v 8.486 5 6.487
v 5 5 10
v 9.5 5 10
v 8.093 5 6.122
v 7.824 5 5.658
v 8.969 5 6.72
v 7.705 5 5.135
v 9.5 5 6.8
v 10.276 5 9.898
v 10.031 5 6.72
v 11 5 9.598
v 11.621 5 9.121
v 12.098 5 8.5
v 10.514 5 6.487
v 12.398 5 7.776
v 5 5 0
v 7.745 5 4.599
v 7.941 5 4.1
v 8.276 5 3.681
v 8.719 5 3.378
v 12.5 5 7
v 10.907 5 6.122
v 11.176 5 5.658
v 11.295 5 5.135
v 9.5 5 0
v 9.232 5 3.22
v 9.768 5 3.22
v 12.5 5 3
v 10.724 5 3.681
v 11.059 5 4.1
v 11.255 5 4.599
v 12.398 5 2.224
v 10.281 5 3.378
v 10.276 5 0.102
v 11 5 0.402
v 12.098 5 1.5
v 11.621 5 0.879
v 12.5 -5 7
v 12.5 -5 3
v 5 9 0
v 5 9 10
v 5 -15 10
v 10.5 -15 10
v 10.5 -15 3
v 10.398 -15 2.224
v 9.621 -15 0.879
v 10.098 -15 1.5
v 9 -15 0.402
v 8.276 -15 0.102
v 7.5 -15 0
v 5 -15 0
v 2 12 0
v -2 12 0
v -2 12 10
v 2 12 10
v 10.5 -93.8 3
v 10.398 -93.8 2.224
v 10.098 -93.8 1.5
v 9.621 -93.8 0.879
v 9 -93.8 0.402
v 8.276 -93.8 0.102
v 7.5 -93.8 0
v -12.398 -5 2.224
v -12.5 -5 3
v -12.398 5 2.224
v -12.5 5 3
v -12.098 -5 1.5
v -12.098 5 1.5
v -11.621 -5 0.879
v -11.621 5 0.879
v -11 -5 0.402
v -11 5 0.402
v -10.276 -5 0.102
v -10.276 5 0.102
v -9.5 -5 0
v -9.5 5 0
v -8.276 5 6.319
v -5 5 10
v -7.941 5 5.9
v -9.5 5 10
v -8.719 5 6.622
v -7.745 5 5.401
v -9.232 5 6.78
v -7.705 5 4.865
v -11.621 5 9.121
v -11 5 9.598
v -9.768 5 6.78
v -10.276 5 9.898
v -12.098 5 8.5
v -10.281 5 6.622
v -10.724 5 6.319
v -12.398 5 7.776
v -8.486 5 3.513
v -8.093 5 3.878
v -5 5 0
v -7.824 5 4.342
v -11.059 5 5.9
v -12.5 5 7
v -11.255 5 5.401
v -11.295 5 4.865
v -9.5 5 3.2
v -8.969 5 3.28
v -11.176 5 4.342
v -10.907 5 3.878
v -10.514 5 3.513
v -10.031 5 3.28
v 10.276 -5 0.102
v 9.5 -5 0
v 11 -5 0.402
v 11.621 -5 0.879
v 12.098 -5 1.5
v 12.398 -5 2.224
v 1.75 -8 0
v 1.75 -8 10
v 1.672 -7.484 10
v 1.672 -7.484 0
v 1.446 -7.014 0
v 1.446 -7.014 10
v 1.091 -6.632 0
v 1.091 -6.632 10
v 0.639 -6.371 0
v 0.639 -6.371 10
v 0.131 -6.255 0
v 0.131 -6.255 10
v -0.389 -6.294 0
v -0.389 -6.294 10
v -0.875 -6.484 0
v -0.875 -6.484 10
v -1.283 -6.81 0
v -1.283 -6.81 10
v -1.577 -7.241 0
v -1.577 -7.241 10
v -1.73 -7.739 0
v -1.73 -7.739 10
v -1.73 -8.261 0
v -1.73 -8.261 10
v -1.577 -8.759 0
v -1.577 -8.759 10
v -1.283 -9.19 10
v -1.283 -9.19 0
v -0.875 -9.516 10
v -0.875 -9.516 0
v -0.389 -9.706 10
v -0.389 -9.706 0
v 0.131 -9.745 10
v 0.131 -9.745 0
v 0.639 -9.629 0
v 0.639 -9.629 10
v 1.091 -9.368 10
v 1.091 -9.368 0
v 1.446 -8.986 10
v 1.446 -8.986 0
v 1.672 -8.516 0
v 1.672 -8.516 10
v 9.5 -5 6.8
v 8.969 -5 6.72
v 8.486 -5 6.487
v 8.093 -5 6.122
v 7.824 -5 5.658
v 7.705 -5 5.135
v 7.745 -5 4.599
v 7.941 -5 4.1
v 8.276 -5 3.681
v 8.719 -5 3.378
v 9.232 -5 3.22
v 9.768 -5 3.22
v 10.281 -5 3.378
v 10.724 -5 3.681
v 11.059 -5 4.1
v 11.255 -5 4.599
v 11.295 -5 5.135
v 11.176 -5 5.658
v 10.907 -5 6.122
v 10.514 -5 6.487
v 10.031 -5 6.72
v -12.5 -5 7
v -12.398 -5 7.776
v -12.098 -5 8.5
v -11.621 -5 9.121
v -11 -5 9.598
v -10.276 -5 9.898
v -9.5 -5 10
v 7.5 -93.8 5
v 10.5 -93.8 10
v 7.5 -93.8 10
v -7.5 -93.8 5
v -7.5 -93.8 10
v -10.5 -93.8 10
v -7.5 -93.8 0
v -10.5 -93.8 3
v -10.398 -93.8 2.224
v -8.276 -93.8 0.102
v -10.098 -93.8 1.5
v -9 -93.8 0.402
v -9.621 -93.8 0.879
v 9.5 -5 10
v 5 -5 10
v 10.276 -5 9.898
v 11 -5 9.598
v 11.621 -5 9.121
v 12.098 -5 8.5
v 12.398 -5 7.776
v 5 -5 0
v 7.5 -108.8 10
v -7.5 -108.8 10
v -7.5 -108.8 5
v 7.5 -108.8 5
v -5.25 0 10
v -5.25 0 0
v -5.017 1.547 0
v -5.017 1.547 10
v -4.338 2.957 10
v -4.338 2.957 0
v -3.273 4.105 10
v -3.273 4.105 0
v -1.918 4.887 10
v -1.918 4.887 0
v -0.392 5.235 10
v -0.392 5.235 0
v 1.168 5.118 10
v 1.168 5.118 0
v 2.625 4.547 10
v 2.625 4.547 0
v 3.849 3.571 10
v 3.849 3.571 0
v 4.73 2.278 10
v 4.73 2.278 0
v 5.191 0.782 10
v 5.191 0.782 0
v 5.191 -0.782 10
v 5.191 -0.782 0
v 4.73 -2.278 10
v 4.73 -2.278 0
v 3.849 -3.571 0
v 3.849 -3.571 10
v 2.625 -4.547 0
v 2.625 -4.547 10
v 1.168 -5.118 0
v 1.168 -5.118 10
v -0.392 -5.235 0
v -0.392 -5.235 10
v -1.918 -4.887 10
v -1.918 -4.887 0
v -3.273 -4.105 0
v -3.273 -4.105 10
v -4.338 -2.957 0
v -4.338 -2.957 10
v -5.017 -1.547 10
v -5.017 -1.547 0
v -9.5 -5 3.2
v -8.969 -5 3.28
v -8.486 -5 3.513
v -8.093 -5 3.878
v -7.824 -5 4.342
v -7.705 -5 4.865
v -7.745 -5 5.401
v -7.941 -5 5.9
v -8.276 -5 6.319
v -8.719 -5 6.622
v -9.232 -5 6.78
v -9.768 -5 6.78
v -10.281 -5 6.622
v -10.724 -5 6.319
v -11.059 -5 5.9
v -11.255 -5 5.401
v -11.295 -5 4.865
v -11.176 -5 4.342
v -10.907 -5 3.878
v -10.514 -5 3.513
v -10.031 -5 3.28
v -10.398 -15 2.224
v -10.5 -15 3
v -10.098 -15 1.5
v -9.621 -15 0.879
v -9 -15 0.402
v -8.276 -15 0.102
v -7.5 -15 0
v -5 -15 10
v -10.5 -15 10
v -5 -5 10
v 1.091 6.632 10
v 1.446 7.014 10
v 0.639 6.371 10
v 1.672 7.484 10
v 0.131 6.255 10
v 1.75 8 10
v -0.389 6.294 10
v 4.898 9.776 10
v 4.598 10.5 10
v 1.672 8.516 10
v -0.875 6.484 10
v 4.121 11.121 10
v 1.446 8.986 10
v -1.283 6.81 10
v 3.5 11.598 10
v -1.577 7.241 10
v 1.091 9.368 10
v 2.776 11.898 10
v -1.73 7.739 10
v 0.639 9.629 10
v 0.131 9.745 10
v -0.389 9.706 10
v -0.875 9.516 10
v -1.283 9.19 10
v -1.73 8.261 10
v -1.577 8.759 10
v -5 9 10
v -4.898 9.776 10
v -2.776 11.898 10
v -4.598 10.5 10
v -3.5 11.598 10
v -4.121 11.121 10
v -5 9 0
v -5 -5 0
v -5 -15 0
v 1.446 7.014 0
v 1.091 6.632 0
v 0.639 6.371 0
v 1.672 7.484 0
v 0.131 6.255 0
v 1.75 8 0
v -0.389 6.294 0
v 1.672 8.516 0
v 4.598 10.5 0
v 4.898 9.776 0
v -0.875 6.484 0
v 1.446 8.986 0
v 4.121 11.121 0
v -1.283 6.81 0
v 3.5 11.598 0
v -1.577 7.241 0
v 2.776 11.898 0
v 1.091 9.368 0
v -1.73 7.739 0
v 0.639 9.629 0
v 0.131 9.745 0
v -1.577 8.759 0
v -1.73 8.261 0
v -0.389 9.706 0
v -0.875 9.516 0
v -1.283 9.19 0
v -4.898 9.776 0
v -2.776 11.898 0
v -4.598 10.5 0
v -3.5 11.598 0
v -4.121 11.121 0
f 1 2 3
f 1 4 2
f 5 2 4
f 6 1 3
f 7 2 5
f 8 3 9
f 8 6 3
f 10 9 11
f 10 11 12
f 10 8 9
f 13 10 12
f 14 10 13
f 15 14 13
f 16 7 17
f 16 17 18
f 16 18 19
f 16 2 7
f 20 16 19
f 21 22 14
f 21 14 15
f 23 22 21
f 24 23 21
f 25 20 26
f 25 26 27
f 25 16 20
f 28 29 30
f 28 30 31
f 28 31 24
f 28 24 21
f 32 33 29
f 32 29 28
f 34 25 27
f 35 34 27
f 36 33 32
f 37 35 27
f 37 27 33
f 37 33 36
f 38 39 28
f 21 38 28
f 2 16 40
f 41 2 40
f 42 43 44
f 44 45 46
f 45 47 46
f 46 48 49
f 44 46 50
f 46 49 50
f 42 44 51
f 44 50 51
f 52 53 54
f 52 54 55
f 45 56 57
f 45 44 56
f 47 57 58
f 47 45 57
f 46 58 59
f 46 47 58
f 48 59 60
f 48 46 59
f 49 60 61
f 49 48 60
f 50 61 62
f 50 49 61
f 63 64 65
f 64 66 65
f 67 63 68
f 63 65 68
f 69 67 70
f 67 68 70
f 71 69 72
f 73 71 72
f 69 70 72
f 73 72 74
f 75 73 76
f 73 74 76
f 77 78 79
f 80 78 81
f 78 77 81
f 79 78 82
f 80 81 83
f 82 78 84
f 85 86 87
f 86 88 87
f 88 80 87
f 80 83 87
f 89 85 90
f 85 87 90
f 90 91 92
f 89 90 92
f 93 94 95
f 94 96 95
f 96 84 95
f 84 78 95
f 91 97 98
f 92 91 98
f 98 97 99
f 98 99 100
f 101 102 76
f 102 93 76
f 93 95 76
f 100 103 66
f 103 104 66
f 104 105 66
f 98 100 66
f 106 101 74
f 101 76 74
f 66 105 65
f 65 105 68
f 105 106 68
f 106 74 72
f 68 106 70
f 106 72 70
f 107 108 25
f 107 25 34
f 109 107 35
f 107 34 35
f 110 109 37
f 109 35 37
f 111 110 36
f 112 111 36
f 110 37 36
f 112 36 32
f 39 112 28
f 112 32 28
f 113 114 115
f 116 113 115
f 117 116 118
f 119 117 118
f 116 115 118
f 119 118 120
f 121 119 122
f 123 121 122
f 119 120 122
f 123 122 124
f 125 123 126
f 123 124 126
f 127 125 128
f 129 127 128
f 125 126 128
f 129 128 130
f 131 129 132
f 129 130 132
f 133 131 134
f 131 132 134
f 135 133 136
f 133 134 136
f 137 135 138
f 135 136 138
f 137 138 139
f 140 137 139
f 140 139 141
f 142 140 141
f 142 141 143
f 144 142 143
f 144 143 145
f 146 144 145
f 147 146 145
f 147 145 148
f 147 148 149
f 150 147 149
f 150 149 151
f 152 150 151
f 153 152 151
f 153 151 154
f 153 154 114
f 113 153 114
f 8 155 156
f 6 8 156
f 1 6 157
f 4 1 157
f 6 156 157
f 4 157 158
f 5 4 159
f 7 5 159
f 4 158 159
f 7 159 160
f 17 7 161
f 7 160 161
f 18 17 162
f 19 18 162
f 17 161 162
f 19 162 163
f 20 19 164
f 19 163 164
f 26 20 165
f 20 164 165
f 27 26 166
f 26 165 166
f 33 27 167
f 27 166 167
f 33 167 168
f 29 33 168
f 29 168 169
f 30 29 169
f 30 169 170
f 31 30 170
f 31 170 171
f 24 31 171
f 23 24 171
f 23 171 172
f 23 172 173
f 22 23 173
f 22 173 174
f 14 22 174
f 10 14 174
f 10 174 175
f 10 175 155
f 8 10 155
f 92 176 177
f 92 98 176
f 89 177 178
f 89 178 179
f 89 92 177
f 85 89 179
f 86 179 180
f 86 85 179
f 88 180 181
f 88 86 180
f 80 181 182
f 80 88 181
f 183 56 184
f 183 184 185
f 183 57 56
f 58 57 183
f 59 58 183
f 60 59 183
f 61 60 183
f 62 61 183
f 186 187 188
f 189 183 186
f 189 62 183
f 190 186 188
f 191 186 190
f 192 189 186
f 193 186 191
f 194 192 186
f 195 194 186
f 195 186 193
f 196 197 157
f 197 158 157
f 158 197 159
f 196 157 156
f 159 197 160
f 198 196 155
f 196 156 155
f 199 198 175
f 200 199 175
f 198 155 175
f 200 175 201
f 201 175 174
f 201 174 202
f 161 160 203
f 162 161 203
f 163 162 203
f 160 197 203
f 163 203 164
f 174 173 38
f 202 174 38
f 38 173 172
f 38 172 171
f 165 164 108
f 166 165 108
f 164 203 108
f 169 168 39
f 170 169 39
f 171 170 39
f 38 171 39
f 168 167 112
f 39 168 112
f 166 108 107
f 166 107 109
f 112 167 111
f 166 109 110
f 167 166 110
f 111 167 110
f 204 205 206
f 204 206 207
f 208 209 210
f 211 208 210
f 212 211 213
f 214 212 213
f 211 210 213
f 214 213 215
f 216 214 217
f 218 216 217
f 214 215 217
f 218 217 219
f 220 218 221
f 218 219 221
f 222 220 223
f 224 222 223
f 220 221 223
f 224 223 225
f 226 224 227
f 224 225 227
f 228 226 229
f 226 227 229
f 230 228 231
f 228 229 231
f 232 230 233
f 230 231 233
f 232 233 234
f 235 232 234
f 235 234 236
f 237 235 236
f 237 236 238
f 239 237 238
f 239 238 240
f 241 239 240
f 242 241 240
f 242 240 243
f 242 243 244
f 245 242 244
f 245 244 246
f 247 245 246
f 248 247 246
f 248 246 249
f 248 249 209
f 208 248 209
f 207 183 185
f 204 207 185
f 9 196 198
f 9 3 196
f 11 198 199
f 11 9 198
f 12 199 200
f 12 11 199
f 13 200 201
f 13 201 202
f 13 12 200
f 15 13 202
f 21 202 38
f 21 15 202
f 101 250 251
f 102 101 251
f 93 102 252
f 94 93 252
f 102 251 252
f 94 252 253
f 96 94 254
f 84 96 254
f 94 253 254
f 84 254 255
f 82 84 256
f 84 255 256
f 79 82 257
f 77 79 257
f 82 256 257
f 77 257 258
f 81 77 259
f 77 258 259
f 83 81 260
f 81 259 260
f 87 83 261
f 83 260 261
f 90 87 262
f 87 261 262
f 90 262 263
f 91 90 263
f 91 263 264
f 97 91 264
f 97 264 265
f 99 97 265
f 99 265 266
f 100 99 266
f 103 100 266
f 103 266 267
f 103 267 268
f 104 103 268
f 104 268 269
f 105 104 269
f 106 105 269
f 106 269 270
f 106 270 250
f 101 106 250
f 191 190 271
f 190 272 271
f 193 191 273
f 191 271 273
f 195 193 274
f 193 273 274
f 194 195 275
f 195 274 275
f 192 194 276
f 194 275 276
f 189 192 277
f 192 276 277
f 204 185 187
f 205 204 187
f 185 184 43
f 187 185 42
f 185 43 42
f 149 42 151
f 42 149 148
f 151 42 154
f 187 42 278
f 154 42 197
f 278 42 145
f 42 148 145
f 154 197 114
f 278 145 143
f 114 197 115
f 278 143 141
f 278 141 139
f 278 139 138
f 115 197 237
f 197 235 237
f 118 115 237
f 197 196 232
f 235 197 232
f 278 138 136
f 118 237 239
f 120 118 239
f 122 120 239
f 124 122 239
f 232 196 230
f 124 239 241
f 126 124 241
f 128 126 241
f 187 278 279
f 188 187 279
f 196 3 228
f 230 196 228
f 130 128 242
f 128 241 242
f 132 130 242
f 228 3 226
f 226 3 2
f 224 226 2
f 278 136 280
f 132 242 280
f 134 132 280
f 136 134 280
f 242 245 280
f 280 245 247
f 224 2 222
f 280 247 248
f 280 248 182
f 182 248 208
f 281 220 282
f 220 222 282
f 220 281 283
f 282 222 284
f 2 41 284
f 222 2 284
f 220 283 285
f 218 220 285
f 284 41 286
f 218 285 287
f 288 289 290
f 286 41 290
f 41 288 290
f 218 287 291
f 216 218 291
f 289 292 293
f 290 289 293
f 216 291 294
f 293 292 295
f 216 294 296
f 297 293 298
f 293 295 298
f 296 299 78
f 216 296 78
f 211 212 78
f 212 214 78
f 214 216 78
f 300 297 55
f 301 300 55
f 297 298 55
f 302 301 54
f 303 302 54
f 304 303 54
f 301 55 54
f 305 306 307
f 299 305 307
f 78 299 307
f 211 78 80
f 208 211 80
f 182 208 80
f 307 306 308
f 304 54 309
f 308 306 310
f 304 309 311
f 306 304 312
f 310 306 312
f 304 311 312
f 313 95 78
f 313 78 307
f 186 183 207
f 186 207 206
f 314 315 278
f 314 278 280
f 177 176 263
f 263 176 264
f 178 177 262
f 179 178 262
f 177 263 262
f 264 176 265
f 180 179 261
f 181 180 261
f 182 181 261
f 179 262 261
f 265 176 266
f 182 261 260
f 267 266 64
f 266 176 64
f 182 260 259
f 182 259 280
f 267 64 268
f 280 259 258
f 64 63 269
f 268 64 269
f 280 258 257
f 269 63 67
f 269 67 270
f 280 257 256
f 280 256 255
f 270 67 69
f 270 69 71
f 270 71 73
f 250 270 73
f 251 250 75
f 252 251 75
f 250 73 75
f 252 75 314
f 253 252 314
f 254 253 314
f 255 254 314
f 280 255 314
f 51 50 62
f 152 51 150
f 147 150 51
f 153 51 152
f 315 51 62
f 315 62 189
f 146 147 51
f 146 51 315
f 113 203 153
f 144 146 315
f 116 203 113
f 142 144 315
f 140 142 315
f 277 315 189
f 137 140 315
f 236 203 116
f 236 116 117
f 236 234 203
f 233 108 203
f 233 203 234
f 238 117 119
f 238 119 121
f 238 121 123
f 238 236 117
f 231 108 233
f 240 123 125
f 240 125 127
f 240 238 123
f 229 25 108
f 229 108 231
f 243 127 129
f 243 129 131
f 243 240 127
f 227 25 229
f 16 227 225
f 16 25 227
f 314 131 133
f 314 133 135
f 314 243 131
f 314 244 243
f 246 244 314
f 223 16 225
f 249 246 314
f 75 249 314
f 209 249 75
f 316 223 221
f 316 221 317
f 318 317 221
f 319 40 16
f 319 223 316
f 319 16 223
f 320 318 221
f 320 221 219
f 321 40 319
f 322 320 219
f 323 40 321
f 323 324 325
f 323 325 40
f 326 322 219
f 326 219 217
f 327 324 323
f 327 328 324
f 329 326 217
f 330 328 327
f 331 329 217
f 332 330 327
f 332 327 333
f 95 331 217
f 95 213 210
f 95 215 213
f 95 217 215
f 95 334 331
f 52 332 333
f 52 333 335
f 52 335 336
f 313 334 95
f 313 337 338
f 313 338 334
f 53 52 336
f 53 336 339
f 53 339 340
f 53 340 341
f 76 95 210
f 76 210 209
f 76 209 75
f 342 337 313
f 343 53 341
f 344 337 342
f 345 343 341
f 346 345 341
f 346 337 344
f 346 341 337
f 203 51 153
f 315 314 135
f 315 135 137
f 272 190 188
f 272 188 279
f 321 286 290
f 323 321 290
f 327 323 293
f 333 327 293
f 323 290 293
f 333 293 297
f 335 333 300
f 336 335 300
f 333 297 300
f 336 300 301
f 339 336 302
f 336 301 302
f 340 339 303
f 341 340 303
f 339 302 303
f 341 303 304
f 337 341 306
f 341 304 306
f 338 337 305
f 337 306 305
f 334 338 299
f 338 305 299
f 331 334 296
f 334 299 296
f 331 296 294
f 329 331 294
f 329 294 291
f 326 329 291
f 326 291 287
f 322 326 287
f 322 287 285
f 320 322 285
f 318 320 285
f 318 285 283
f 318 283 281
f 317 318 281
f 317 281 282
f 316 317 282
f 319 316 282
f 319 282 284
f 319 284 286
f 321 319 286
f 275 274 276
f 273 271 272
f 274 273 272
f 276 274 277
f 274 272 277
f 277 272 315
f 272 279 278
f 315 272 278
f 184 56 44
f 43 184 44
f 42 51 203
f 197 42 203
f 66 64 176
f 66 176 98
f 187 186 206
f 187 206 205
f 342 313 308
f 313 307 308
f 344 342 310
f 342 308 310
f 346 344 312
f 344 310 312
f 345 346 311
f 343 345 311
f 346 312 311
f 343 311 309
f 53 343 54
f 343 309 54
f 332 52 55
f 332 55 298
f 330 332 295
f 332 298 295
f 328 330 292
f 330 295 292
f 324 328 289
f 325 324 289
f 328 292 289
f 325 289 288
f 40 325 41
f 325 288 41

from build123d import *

# Parameters (mm, degrees)
SKETCH_1_W          = 7.5
SKETCH_1_H          = 10
SKETCH_1_W_2        = 10
SKETCH_1_H_2        = 7
EXTRUDE_1_DEPTH     = 10
CUT_EXTRUDE_1_REACH = 25.351
SKETCH_2_R          = 1.8
CUT_EXTRUDE_2_REACH = 23.937
SKETCH_3_R          = 5.25
FILLET_1_R          = 3
CUT_EXTRUDE_4_REACH = 23.937
SKETCH_5_R          = 1.75
SKETCH_6_W          = 15
SKETCH_6_H          = 10
EXTRUDE_2_DEPTH     = 93.8
SKETCH_7_W          = 21
SKETCH_7_H          = 78.8
EXTRUDE_3_DEPTH     = 10
FILLET_2_R          = 3
SKETCH_8_W          = 15
SKETCH_8_H          = 15
CUT_EXTRUDE_5_DEPTH = 5
FILLET_3_R          = 3


with BuildPart() as part:
    # 草图1 → 凸台-拉伸1 (new body)
    with BuildSketch(Plane.XY):
        with Locations((-8.75, 0)):
            Rectangle(SKETCH_1_W, SKETCH_1_H)
        Rectangle(SKETCH_1_W_2, SKETCH_1_H)
        with Locations((0, 8.5)):
            Rectangle(SKETCH_1_W_2, SKETCH_1_H_2)
        with Locations((8.75, 0)):
            Rectangle(SKETCH_1_W, SKETCH_1_H)
        with Locations((0, -10)):
            Rectangle(SKETCH_1_W_2, SKETCH_1_H)
    extrude(amount=EXTRUDE_1_DEPTH)

    # 草图2 → 切除-拉伸1 (cut, up to next)
    with BuildSketch(Plane.XZ.offset(5), mode=Mode.PRIVATE) as cut_extrude_1_sk1:
        with Locations(Location((-9.5, 5, 0), (0, 0, 270))):
            Circle(SKETCH_2_R)
    cut_extrude_1_tool1 = extrude(cut_extrude_1_sk1.sketch, amount=-CUT_EXTRUDE_1_REACH, mode=Mode.PRIVATE) & part.part
    # 草图2 → 切除-拉伸1 (cut, up to next)
    with BuildSketch(Plane.XZ.offset(5), mode=Mode.PRIVATE) as cut_extrude_1_sk2:
        with Locations(Location((9.5, 5, 0), (0, 0, 90))):
            Circle(SKETCH_2_R)
    cut_extrude_1_tool2 = extrude(cut_extrude_1_sk2.sketch, amount=-CUT_EXTRUDE_1_REACH, mode=Mode.PRIVATE) & part.part
    add(cut_extrude_1_tool1.solids().sort_by_distance((-9.5, -5, 5))[0], mode=Mode.SUBTRACT)
    add(cut_extrude_1_tool2.solids().sort_by_distance((9.5, -5, 5))[0], mode=Mode.SUBTRACT)

    # 草图3 → 切除-拉伸2 (cut, up to next)
    with BuildSketch(Plane(origin=(0, 0, 0), x_dir=(-1, 0, 0), z_dir=(0, 0, -1)), mode=Mode.PRIVATE) as cut_extrude_2_sk1:
        Circle(SKETCH_3_R)
    cut_extrude_2_tool1 = extrude(cut_extrude_2_sk1.sketch, amount=-CUT_EXTRUDE_2_REACH, mode=Mode.PRIVATE) & part.part
    add(cut_extrude_2_tool1.solids().sort_by_distance((0, 0, 0))[0], mode=Mode.SUBTRACT)

    # 圆角1
    fillet_1_edges = [part.edges().sort_by_distance(p)[0] for p in [
        (12.5, 0, 0),
        (-12.5, 0, 0),
        (12.5, 0, 10),
        (-12.5, 0, 10),
    ]]
    fillet(fillet_1_edges, radius=FILLET_1_R)

    # 草图5 → 切除-拉伸4 (cut, up to next)
    with BuildSketch(Plane.XY.offset(10), mode=Mode.PRIVATE) as cut_extrude_4_sk1:
        with Locations((0, 8)):
            Circle(SKETCH_5_R)
    cut_extrude_4_tool1 = extrude(cut_extrude_4_sk1.sketch, amount=-CUT_EXTRUDE_4_REACH, mode=Mode.PRIVATE) & part.part
    # 草图5 → 切除-拉伸4 (cut, up to next)
    with BuildSketch(Plane.XY.offset(10), mode=Mode.PRIVATE) as cut_extrude_4_sk2:
        with Locations((0, -8)):
            Circle(SKETCH_5_R)
    cut_extrude_4_tool2 = extrude(cut_extrude_4_sk2.sketch, amount=-CUT_EXTRUDE_4_REACH, mode=Mode.PRIVATE) & part.part
    add(cut_extrude_4_tool1.solids().sort_by_distance((0, 8, 10))[0], mode=Mode.SUBTRACT)
    add(cut_extrude_4_tool2.solids().sort_by_distance((0, -8, 10))[0], mode=Mode.SUBTRACT)

    # 草图6 → 凸台-拉伸2 (add)
    with BuildSketch(Plane.XZ.offset(15)):
        with Locations((0, 5)):
            Rectangle(SKETCH_6_W, SKETCH_6_H)
    extrude(amount=EXTRUDE_2_DEPTH)

    # 草图7 → 凸台-拉伸3 (add)
    with BuildSketch(Plane(origin=(0, 0, 0), x_dir=(-1, 0, 0), z_dir=(0, 0, -1))):
        with Locations((0, -54.4)):
            Rectangle(SKETCH_7_W, SKETCH_7_H)
    extrude(amount=-EXTRUDE_3_DEPTH)

    # 圆角2
    fillet_2_edges = [part.edges().sort_by_distance(p)[0] for p in [
        (-10.5, -54.4, 0),
        (10.5, -54.4, 0),
    ]]
    fillet(fillet_2_edges, radius=FILLET_2_R)

    # 草图8 → 切除-拉伸5 (cut)
    with BuildSketch(Plane(origin=(0, 0, 0), x_dir=(-1, 0, 0), z_dir=(0, 0, -1))):
        with Locations((0, -101.3)):
            Rectangle(SKETCH_8_W, SKETCH_8_H)
    extrude(amount=-CUT_EXTRUDE_5_DEPTH, mode=Mode.SUBTRACT)

    # 圆角3
    fillet_3_edges = [part.edges().sort_by_distance(p)[0] for p in [
        (-5, 12, 5),
        (5, 12, 5),
    ]]
    fillet(fillet_3_edges, radius=FILLET_3_R)


solid = part.part
